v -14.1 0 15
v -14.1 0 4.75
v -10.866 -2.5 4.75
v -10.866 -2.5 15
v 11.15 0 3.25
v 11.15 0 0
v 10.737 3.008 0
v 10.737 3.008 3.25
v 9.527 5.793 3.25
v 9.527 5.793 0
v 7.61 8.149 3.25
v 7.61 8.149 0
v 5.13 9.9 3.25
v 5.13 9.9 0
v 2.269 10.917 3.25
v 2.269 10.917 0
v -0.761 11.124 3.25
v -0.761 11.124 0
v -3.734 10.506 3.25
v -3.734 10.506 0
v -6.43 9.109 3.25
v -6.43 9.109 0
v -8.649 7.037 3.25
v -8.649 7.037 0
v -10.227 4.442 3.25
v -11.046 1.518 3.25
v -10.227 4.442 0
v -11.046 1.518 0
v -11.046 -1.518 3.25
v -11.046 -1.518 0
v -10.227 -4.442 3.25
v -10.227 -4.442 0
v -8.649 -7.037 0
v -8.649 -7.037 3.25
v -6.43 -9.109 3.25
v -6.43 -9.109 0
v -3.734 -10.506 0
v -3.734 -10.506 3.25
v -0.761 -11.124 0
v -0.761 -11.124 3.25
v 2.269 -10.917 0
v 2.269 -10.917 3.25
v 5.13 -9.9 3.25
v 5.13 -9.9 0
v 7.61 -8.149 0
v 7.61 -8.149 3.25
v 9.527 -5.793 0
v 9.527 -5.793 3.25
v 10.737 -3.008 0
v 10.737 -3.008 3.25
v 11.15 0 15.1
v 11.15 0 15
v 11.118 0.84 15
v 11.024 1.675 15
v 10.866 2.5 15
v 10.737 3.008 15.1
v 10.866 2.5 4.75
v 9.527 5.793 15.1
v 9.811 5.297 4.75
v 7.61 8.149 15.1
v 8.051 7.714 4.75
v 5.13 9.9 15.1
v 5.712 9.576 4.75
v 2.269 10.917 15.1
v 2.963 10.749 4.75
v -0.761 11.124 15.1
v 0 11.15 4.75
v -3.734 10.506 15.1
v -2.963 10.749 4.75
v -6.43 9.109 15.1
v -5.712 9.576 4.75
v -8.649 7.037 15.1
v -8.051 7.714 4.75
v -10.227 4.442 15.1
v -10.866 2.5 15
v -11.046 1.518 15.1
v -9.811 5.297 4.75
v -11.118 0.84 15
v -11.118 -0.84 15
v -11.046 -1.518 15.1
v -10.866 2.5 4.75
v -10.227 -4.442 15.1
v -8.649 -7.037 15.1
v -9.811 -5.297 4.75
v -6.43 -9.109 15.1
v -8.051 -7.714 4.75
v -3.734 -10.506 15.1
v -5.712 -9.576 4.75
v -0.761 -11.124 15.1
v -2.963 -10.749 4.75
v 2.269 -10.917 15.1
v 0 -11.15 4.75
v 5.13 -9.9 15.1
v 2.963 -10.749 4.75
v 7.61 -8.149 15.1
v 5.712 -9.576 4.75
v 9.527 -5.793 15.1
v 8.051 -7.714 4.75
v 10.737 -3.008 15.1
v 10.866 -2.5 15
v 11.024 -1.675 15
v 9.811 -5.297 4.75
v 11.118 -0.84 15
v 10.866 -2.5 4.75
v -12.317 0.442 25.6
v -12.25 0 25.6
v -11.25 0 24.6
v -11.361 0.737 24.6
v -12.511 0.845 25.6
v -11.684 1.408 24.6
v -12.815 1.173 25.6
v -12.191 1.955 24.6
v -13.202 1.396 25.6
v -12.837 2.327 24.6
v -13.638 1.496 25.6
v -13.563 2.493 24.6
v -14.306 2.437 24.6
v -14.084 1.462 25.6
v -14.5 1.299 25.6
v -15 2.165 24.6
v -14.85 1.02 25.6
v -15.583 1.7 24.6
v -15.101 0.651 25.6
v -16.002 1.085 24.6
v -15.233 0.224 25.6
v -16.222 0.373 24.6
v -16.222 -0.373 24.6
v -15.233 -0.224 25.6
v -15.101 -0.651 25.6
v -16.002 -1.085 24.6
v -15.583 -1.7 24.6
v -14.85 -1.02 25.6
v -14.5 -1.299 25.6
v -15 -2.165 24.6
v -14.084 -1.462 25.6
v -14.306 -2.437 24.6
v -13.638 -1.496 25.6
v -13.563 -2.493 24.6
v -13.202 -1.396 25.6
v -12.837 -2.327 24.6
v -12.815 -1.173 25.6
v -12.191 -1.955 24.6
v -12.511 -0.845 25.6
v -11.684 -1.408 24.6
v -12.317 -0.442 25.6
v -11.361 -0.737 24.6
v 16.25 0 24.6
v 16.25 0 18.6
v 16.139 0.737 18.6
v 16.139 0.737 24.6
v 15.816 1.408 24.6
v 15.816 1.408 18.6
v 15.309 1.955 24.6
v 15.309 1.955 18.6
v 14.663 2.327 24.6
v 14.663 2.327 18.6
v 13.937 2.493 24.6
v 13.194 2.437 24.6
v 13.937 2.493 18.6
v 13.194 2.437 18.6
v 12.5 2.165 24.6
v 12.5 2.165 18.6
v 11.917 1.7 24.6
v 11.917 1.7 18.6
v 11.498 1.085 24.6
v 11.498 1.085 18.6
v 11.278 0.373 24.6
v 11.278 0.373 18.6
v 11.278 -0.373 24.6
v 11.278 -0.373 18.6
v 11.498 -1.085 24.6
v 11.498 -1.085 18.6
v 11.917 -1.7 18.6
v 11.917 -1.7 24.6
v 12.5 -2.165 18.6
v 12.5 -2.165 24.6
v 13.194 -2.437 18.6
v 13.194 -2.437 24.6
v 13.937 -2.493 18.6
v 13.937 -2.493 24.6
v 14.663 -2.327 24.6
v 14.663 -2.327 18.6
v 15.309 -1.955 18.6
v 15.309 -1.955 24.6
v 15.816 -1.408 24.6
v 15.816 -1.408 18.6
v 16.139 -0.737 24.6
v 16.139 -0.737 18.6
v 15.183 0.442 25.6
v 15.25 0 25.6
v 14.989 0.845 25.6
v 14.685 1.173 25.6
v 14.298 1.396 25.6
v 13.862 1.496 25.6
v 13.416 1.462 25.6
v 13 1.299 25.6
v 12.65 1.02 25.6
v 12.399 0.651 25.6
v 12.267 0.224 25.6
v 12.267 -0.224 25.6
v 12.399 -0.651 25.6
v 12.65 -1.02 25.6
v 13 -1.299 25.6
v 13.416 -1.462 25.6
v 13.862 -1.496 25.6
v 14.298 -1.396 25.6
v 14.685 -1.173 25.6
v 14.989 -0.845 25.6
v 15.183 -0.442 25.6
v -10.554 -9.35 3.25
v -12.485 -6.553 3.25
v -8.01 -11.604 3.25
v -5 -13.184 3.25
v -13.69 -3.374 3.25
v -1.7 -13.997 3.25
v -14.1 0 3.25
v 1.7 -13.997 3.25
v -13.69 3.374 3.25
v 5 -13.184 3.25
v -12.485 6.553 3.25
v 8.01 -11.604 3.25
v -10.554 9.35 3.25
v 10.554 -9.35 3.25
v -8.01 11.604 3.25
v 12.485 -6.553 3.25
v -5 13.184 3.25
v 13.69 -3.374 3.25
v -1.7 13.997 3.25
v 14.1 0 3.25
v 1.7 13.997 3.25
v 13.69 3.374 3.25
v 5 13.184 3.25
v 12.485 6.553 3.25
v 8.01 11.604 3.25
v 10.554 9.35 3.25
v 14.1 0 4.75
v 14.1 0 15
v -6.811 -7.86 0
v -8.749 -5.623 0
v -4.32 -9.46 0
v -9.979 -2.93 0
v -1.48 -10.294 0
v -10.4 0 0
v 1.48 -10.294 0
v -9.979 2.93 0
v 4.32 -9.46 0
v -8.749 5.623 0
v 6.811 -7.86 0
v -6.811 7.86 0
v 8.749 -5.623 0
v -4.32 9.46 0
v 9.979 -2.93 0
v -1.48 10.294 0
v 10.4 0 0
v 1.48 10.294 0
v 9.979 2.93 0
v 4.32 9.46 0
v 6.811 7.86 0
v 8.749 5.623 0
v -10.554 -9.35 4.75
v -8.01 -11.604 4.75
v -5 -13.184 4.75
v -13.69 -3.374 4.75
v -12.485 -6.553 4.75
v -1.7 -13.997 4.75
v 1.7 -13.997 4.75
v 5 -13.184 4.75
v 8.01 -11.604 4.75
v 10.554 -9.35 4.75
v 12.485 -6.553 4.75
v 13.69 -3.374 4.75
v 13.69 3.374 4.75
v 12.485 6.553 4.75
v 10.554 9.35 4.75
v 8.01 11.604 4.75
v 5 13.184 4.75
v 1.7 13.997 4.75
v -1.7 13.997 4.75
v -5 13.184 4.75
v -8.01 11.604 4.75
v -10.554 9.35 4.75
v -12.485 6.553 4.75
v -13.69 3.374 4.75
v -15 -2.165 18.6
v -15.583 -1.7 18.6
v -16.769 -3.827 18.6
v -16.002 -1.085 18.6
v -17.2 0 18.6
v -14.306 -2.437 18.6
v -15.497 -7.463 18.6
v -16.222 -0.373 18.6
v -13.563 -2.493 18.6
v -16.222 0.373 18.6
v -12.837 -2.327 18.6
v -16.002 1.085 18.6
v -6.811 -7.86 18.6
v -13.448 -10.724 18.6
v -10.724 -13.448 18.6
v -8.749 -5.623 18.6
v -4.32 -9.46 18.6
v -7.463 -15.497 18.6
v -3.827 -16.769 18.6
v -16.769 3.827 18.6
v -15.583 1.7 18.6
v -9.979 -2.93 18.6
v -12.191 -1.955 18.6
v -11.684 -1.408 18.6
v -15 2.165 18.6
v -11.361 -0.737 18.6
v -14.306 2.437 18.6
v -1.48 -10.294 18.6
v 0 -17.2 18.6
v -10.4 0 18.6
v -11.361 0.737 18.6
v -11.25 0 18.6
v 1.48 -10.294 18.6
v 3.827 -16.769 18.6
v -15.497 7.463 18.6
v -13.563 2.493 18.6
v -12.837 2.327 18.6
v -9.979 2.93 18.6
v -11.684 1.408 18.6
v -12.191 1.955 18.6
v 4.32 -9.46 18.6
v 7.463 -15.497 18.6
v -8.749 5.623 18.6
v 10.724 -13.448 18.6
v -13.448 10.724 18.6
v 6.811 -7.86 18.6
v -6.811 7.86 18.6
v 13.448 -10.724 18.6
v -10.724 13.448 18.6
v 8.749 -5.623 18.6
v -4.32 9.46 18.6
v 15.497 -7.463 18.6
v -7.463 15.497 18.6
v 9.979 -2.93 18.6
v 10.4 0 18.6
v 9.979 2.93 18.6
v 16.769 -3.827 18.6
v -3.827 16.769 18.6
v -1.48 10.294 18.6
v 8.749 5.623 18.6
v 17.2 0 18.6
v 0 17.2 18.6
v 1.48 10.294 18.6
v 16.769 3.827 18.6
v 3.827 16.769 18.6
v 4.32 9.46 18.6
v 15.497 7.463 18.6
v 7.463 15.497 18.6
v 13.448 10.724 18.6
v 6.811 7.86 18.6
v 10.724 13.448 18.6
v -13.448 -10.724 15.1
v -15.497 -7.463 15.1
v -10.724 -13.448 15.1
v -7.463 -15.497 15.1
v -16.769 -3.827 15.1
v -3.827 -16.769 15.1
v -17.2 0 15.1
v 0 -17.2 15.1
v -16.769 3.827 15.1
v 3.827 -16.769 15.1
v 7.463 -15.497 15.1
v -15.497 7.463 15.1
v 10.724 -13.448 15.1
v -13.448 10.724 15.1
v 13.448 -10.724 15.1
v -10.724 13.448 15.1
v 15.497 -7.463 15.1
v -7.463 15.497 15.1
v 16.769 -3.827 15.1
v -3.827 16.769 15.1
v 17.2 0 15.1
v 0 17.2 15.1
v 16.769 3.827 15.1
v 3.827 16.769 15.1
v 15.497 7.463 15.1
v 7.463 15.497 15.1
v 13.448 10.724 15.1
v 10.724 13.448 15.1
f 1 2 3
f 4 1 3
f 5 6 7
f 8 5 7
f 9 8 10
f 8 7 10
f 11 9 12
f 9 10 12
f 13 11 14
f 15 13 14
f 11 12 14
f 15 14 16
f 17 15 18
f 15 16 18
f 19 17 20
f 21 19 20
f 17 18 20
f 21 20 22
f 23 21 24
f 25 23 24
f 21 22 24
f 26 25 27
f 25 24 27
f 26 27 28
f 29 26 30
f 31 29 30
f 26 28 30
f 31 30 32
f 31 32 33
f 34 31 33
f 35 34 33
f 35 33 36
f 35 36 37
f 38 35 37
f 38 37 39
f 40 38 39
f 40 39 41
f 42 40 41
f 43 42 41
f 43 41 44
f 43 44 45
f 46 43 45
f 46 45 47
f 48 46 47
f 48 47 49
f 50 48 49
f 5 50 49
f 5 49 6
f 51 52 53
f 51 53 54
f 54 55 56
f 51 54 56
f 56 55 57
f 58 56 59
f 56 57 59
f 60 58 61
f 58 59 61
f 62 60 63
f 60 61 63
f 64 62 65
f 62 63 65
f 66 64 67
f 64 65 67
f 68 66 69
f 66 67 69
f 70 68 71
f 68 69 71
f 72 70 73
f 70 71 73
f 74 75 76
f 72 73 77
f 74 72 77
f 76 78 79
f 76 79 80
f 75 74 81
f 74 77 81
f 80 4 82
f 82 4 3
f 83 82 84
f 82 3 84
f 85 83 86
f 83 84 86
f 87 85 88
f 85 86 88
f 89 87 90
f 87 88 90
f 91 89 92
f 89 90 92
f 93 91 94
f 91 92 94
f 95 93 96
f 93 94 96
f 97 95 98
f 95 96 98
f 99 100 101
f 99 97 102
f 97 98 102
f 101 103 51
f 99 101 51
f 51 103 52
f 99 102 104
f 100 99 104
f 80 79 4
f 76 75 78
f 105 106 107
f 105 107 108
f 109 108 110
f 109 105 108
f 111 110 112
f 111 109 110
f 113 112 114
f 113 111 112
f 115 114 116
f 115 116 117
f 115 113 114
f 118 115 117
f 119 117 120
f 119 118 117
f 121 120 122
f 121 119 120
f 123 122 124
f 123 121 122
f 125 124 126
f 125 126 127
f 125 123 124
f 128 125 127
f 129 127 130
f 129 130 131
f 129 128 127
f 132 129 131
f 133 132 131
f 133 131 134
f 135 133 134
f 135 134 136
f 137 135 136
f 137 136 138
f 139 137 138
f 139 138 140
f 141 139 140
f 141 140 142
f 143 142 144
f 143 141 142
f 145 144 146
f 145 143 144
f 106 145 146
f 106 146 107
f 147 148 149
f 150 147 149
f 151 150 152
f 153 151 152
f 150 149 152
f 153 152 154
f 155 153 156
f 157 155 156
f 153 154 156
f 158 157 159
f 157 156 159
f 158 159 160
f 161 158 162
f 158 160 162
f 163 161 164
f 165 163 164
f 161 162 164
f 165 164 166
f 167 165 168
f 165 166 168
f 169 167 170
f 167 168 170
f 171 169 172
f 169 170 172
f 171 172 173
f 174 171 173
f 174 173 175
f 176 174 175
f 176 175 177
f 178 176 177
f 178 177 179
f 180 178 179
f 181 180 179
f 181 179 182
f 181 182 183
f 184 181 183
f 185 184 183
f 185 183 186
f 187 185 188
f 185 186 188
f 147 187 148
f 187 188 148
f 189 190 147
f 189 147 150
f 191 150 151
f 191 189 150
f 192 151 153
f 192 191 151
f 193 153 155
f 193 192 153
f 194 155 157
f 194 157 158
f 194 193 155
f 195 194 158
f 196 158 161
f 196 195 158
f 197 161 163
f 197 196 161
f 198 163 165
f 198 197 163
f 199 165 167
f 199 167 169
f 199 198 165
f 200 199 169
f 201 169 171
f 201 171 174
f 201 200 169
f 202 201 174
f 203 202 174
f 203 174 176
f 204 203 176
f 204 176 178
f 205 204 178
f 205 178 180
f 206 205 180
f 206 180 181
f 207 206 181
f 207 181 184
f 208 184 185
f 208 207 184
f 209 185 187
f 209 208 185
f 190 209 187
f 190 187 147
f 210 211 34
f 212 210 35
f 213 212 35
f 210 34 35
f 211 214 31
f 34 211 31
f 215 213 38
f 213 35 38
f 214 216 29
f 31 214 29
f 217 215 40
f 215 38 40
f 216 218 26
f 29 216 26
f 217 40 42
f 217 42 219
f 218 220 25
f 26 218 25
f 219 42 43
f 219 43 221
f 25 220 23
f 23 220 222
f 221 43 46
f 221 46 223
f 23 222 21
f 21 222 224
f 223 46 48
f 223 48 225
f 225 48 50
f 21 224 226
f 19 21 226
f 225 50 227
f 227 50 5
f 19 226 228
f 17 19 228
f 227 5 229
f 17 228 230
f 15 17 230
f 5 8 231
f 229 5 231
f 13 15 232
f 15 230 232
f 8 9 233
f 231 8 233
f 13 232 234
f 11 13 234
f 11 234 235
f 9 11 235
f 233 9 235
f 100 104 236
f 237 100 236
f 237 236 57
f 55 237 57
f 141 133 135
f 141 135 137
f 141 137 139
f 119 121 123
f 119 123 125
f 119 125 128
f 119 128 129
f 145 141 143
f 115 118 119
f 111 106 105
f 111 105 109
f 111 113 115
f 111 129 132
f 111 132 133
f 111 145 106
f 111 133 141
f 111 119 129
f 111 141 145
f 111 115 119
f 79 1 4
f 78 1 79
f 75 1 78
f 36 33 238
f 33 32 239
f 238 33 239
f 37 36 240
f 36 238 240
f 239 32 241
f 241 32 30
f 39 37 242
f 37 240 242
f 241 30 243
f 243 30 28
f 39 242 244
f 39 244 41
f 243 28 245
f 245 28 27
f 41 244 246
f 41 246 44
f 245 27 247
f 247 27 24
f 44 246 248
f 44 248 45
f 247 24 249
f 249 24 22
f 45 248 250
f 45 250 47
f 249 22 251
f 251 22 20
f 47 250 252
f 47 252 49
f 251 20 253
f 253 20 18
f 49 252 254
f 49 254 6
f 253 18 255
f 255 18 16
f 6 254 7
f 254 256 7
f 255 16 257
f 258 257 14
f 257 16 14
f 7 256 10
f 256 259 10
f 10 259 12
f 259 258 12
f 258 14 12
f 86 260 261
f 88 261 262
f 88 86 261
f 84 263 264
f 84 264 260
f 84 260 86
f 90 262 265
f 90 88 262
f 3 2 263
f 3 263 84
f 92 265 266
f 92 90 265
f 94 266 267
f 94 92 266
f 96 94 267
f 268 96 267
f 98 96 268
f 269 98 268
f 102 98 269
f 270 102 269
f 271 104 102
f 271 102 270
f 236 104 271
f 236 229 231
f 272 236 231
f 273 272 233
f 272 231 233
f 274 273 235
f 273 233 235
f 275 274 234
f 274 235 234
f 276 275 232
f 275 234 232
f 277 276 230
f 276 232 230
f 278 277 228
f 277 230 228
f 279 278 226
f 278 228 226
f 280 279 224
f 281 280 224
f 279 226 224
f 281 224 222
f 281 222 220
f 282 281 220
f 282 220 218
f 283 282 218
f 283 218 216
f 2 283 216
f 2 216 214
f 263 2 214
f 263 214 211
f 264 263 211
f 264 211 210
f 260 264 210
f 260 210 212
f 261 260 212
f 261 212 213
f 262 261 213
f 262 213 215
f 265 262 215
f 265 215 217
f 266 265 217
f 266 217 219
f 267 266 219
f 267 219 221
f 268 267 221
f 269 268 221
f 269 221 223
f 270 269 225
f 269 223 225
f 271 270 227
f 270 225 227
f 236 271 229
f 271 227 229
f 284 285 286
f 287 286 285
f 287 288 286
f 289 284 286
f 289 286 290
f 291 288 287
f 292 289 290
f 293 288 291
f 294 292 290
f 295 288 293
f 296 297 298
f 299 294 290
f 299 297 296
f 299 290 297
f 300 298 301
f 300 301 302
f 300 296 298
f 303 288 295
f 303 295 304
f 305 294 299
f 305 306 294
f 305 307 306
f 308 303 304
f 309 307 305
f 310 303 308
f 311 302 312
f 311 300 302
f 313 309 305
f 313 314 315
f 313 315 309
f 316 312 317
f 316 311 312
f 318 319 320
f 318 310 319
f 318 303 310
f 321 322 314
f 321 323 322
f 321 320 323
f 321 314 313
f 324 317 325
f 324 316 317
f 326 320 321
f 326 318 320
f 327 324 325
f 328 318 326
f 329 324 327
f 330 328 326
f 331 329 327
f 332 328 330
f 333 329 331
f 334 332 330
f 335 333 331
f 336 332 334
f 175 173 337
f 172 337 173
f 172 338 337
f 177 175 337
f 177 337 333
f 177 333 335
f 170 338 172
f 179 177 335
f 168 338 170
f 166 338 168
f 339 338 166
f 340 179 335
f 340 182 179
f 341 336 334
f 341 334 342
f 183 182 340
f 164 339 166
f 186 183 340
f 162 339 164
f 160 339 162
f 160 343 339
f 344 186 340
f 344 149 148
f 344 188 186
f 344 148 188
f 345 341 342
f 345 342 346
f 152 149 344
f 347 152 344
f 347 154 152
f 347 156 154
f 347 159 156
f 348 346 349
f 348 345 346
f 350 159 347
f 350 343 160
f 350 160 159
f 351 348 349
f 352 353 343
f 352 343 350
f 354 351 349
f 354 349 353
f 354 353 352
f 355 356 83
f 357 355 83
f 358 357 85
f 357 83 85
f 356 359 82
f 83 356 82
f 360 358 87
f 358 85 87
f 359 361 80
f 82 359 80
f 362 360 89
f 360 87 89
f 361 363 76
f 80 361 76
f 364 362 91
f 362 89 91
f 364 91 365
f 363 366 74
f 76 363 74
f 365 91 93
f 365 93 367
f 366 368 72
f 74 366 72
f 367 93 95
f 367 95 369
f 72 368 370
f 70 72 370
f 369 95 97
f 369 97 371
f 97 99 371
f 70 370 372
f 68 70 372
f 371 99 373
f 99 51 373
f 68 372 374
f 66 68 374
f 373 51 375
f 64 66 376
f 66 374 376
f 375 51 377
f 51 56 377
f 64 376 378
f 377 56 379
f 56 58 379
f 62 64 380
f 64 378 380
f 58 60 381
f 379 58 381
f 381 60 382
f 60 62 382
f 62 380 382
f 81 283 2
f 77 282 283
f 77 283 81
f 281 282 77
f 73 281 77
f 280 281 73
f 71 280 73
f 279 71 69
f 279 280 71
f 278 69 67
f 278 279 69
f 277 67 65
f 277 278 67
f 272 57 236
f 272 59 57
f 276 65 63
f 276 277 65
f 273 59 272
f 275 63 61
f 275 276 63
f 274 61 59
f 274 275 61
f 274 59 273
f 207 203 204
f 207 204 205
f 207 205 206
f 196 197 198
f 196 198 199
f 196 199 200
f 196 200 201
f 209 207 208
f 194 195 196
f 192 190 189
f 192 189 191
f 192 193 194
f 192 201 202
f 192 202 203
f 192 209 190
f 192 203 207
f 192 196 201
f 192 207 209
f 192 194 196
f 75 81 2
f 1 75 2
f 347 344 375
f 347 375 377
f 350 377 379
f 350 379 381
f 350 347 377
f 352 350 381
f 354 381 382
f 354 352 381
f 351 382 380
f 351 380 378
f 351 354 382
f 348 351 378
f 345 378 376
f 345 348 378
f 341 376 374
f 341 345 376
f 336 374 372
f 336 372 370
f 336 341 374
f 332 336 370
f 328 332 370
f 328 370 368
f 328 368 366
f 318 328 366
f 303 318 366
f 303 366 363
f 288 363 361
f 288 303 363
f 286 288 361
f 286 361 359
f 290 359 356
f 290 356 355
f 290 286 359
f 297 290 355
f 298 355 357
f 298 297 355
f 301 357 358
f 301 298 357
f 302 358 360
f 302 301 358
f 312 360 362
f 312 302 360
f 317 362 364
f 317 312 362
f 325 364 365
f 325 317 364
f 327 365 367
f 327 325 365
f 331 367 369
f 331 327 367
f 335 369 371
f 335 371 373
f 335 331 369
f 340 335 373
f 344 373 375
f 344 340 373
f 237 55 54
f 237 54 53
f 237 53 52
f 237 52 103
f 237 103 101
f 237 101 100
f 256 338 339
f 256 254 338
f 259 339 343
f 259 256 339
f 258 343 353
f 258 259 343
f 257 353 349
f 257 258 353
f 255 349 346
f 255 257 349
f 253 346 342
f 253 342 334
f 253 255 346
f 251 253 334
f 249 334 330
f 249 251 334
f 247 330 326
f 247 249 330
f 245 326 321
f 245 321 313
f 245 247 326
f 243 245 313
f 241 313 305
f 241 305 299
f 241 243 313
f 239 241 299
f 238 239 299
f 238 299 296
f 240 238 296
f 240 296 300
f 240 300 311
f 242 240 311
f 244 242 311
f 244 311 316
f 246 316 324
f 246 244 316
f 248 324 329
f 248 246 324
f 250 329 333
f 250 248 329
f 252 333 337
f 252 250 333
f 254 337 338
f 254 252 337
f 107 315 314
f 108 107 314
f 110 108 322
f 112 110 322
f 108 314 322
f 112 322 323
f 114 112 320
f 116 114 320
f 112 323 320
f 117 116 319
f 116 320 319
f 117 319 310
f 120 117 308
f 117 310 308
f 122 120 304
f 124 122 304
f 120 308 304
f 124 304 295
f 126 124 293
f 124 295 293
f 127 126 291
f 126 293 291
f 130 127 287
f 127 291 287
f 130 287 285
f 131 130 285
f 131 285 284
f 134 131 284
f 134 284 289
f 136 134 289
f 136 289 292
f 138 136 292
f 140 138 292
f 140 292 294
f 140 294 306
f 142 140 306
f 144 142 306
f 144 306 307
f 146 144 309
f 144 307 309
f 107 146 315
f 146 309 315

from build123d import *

# Parameters (mm, degrees)
F0_R     = 11.15
F0_R_2   = 10.4
F1_DEPTH = 18.6
F2_START = 3.25
F0_R_3   = 14.1
F2_DEPTH = 1.5
F3_R     = 17.2
F3_R_2   = 11.15
F3_R_3   = 10.4
F4_DEPTH = 3.5
F5_R     = 2.5
F6_DEPTH = 7
F7_SIZE  = 1
F9_DEPTH = 10.25


with BuildPart() as f1:
    # F0 (on Top) → F1 (new body)
    with BuildSketch(Plane.XY):
        Circle(F0_R)
        Circle(F0_R_2, mode=Mode.SUBTRACT)
    extrude(amount=F1_DEPTH)

    # F0 (on Top) → F2 (join)
    with BuildSketch(Plane.XY.offset(F2_START)):
        Circle(F0_R_3)
        Circle(F0_R, mode=Mode.SUBTRACT)
    extrude(amount=F2_DEPTH)

    # F3 (on face) → F4 (join)
    with BuildSketch(Plane.XY.offset(18.6)):
        Circle(F3_R)
        Circle(F3_R_2, mode=Mode.SUBTRACT)
        Circle(F3_R_2)
        Circle(F3_R_3, mode=Mode.SUBTRACT)
    extrude(amount=-F4_DEPTH)

    # F5 (on face) → F6 (join)
    with BuildSketch(Plane.XY.offset(18.6)):
        with Locations((13.75, 0)):
            Circle(F5_R)
        with Locations((-13.75, 0)):
            Circle(F5_R)
    extrude(amount=F6_DEPTH)

    # F7
    f7_edges = [f1.edges().sort_by_distance(p)[0] for p in [
        (-16.25, 0, 25.6),
        (11.25, 0, 25.6),
    ]]
    chamfer(f7_edges, length=F7_SIZE)

    # F8 (on face) → F9 (join)
    with BuildSketch(Plane.XY.offset(4.75)):
        with BuildLine():
            Line((10.8661170618, -2.5), (14.1, 0))
            Line((14.1, 0), (10.8661170618, 2.5))
            ThreePointArc((10.8661170618, 2.5), (11.0788019487, 1.2580331397), (11.15, 0))
            ThreePointArc((11.15, 0), (11.0788019487, -1.2580331397), (10.8661170618, -2.5))
        make_face()
        with BuildLine():
            Line((-10.8661170618, 2.5), (-14.1, 0))
            Line((-14.1, 0), (-10.8661170618, -2.5))
            ThreePointArc((-10.8661170618, -2.5), (-11.15, 0), (-10.8661170618, 2.5))
        make_face()
    extrude(amount=F9_DEPTH)


solid = f1.part
